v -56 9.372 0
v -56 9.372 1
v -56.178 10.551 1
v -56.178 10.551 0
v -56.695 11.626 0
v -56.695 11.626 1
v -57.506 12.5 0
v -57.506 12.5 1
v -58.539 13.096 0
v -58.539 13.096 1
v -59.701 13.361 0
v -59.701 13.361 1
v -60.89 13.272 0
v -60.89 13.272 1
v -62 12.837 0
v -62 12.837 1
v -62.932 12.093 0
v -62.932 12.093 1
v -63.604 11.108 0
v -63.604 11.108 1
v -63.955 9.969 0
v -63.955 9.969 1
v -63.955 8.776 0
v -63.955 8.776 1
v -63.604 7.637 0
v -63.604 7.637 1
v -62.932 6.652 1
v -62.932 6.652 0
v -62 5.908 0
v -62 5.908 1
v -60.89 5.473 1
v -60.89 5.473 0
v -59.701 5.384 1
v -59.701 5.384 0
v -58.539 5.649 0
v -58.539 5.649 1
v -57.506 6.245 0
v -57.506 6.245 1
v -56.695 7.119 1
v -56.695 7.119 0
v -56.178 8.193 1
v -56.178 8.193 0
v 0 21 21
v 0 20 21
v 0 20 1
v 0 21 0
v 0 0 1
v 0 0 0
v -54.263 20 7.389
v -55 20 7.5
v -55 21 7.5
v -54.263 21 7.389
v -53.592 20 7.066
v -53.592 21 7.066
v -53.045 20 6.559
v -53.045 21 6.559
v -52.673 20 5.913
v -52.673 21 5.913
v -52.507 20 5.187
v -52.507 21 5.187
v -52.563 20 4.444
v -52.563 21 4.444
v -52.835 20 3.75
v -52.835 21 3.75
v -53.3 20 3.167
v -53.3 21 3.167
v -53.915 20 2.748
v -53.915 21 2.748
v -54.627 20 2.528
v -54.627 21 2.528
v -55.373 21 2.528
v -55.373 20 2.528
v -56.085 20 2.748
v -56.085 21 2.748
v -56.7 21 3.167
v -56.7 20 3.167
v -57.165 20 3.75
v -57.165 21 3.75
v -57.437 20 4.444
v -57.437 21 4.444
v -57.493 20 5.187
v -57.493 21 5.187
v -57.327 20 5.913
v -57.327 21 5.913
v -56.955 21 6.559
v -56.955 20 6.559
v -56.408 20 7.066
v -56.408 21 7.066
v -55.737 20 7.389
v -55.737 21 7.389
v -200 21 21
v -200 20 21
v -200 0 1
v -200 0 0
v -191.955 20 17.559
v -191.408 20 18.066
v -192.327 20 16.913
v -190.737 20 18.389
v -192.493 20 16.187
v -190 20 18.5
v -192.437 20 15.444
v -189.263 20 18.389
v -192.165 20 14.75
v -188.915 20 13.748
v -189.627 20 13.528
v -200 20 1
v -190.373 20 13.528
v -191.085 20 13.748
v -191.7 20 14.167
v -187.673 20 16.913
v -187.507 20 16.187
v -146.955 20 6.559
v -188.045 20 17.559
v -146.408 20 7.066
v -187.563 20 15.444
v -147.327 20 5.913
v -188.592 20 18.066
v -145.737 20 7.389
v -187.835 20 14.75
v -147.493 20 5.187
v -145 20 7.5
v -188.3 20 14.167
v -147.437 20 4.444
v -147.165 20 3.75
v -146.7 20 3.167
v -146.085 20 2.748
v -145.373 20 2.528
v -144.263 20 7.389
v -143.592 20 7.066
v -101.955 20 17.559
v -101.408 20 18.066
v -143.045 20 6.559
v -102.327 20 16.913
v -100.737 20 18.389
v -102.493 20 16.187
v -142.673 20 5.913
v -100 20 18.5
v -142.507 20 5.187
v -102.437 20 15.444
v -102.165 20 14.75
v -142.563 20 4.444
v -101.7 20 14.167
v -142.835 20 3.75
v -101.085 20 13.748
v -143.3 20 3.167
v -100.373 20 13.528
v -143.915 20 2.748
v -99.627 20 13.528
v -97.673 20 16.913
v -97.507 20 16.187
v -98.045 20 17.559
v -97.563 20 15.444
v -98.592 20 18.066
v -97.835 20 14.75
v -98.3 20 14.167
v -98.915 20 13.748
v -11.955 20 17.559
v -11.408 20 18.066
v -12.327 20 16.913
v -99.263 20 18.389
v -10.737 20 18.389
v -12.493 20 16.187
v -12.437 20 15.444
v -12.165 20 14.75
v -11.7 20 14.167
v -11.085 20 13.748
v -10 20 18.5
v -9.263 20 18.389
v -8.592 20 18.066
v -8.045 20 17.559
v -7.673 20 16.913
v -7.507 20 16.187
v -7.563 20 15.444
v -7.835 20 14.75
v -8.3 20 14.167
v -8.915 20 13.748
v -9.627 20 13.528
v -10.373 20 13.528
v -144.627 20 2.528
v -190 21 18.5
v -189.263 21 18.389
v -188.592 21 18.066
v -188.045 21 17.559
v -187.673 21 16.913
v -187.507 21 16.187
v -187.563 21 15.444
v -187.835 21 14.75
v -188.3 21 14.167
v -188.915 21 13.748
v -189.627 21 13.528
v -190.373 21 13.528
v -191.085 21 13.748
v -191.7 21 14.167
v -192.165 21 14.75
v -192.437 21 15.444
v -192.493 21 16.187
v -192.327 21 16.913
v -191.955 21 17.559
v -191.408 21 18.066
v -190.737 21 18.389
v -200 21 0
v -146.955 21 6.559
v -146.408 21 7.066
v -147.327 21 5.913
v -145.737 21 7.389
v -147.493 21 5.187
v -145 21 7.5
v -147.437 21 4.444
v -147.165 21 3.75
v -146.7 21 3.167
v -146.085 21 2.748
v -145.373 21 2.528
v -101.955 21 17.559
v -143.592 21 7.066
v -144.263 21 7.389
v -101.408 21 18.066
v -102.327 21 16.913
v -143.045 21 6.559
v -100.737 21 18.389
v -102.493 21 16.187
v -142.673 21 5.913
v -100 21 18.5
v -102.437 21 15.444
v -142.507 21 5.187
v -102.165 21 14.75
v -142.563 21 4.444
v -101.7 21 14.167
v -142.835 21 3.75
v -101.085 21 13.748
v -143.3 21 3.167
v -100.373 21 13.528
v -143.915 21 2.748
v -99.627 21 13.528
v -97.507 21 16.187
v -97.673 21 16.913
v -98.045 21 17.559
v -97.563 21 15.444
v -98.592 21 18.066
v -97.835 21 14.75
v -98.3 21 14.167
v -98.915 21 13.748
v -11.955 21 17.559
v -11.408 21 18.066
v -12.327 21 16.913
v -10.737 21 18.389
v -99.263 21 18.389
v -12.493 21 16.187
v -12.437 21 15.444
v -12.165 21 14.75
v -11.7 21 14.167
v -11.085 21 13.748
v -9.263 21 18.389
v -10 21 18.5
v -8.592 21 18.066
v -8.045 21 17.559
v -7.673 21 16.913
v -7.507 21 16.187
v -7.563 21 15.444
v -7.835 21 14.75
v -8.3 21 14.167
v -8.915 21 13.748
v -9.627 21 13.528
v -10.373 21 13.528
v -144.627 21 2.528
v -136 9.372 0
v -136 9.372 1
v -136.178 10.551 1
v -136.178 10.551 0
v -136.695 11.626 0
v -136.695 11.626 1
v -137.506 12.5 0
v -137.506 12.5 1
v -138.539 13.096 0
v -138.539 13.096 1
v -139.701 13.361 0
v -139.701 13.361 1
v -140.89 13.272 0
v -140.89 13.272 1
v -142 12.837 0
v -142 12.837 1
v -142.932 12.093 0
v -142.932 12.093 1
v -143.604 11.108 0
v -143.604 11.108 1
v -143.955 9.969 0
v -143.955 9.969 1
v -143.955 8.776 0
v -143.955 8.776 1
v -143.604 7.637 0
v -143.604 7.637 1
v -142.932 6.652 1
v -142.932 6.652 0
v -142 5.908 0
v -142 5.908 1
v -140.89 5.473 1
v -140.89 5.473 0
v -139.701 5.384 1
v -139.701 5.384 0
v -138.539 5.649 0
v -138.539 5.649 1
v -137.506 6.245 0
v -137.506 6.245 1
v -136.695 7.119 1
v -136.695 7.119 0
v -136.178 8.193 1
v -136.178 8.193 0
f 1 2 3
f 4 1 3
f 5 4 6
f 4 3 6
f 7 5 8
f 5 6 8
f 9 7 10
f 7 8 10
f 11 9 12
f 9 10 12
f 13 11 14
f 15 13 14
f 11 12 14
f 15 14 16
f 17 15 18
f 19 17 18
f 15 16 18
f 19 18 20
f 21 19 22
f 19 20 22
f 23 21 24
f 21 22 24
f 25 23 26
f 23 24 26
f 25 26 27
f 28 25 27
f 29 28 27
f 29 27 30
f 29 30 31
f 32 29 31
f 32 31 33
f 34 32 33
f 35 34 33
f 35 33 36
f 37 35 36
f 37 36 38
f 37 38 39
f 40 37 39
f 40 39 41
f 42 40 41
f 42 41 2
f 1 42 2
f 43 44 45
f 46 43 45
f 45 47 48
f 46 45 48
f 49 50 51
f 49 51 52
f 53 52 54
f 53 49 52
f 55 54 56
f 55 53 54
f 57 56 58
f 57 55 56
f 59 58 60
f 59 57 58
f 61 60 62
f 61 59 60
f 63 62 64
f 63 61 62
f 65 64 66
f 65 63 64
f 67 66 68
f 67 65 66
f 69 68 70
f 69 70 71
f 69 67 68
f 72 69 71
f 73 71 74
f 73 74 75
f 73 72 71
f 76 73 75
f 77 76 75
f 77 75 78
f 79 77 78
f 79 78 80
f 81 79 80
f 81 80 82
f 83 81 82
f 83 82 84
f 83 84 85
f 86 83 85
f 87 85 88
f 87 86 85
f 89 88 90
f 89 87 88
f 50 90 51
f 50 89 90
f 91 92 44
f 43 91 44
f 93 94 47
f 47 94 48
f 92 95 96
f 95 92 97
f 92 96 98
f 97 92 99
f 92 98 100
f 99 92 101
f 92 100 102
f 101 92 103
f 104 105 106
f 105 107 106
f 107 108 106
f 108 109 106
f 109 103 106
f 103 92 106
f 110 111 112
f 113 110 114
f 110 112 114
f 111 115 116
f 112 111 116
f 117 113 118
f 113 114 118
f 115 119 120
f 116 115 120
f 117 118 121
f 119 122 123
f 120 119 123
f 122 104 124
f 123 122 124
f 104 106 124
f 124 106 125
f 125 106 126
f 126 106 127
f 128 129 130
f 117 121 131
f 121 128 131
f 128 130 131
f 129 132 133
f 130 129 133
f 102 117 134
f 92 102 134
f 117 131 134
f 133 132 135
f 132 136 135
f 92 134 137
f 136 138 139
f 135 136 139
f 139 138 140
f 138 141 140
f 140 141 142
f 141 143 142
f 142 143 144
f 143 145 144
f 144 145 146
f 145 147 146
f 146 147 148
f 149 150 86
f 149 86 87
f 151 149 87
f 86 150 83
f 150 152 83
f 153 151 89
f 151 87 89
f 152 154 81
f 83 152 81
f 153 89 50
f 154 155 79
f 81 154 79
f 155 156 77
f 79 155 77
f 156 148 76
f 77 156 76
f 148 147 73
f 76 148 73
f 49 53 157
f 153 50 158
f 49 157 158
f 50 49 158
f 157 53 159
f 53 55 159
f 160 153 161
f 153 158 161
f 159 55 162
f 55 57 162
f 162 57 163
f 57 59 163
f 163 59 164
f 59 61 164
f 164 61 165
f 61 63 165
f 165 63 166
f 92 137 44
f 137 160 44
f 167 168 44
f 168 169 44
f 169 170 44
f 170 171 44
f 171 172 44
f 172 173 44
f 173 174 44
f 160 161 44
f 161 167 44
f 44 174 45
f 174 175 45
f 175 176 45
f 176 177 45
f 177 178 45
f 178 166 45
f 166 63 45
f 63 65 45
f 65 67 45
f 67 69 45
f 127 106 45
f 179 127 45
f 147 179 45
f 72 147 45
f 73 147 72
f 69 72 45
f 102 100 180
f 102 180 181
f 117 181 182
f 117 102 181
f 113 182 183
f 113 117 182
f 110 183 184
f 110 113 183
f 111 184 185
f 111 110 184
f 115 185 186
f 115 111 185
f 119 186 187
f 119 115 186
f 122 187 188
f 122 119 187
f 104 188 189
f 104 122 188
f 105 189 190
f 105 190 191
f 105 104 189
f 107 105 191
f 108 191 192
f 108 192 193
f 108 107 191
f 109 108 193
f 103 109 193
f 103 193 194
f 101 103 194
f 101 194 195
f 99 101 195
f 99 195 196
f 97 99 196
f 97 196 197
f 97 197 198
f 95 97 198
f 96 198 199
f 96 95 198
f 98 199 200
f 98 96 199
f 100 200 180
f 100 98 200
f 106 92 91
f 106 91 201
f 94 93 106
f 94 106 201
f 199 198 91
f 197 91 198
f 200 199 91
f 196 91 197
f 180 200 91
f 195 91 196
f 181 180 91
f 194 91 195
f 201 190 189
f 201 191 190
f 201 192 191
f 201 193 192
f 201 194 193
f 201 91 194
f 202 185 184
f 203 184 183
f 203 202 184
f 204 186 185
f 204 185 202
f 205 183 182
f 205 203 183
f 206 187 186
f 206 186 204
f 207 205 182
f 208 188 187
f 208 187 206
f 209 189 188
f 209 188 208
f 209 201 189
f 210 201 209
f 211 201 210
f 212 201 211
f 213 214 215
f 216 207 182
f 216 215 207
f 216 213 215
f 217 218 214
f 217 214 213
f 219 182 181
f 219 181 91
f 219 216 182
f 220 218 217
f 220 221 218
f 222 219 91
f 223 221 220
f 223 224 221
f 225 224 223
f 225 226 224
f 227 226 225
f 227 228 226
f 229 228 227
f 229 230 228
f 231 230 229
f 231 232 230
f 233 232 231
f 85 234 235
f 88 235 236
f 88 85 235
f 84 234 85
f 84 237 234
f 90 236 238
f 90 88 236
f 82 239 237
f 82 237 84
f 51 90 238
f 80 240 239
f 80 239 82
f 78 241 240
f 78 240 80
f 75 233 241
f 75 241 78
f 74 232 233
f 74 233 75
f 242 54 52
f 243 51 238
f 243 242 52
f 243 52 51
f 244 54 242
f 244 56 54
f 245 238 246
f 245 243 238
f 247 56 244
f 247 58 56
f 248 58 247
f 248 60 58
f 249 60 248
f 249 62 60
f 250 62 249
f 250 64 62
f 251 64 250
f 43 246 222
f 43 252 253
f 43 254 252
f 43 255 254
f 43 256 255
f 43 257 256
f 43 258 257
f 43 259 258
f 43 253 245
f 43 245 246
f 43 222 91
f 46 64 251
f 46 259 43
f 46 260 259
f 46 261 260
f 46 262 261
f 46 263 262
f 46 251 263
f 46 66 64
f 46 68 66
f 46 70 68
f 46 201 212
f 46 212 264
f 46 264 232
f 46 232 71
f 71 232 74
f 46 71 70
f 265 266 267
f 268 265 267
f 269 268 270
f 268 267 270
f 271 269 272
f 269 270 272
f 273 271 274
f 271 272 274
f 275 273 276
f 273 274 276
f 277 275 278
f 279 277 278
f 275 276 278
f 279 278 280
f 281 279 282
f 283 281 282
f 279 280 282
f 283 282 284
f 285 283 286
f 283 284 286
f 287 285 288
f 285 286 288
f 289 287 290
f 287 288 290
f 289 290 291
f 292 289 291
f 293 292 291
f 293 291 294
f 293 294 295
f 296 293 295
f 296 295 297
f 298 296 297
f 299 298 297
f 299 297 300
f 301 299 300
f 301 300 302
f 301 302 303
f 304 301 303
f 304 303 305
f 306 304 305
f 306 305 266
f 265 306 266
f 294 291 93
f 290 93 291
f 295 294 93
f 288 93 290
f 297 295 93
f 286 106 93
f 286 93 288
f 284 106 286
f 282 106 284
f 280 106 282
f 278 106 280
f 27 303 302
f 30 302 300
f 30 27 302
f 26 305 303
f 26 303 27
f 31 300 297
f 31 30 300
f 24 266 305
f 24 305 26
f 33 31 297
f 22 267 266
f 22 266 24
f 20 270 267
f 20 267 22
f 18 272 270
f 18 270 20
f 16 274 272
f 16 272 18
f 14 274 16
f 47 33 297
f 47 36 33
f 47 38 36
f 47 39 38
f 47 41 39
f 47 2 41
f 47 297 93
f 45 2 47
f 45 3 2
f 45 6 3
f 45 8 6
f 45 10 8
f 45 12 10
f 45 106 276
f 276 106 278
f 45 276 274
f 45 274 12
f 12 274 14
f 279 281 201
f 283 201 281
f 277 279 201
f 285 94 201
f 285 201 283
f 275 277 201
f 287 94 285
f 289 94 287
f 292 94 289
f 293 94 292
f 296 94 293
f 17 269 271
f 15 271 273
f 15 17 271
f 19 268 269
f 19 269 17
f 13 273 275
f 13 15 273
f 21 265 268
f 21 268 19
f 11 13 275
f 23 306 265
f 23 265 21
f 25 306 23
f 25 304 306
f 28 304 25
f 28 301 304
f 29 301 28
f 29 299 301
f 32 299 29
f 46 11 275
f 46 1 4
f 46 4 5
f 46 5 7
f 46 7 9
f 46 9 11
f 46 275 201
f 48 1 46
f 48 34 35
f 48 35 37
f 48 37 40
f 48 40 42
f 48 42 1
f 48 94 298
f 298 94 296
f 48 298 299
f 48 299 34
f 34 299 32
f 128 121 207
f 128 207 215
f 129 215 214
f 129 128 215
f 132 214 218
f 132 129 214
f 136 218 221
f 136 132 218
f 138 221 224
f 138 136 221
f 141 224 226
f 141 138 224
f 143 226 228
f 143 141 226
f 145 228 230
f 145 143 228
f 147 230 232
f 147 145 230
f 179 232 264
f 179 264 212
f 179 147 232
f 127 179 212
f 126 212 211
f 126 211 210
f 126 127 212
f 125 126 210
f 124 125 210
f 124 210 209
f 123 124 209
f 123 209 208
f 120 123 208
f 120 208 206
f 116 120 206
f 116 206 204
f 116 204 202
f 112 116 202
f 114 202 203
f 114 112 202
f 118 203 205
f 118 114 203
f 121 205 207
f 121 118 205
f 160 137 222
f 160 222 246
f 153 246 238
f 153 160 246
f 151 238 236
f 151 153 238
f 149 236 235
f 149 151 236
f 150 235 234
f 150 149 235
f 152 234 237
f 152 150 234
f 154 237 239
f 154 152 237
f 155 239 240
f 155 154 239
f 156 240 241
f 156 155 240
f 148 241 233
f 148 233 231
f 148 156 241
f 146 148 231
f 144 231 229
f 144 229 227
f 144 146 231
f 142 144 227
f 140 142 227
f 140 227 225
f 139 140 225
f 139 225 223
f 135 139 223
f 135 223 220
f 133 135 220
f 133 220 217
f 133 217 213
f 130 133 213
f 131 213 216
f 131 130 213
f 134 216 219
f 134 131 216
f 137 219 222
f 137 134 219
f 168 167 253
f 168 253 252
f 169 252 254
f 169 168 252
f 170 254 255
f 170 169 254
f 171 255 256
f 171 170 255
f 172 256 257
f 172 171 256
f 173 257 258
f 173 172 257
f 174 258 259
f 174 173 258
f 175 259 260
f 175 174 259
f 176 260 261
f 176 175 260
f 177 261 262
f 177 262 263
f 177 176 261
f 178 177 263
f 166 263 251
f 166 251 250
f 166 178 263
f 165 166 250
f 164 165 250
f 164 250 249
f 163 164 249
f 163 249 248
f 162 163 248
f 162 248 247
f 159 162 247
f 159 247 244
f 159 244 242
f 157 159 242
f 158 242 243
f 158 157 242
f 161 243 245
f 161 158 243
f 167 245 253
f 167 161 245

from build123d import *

# Parameters (mm, degrees)
SKETCH1_W           = 200
SKETCH1_H           = 20
BOSS_EXTRUDE1_DEPTH = 1
SKETCH4_W           = 200
SKETCH4_H           = 21
SKETCH4_R           = 2.5
BOSS_EXTRUDE2_DEPTH = 1
SKETCH5_R           = 4
CUT_EXTRUDE1_DEPTH  = 10


with BuildPart() as part:
    # Sketch1 → Boss-Extrude1 (new body)
    with BuildSketch(Plane.XY):
        with Locations((-100, 10)):
            Rectangle(SKETCH1_W, SKETCH1_H)
    extrude(amount=BOSS_EXTRUDE1_DEPTH)

    # Sketch4 → Boss-Extrude2 (add)
    with BuildSketch(Plane(origin=(0, 20, 0), x_dir=(1, 0, 0), z_dir=(0, 1, 0))):
        with Locations((-100, -10.5)):
            Rectangle(SKETCH4_W, SKETCH4_H)
        with Locations(Location((-190, -16, 0), (0, 0, 270))):
            Circle(SKETCH4_R, mode=Mode.SUBTRACT)
        with Locations(Location((-145, -5, 0), (0, 0, 270))):
            Circle(SKETCH4_R, mode=Mode.SUBTRACT)
        with Locations(Location((-100, -16, 0), (0, 0, 270))):
            Circle(SKETCH4_R, mode=Mode.SUBTRACT)
        with Locations(Location((-55, -5, 0), (0, 0, 270))):
            Circle(SKETCH4_R, mode=Mode.SUBTRACT)
        with Locations(Location((-10, -16, 0), (0, 0, 270))):
            Circle(SKETCH4_R, mode=Mode.SUBTRACT)
    extrude(amount=BOSS_EXTRUDE2_DEPTH)

    # Sketch5 → Cut-Extrude1 (cut)
    with BuildSketch(Plane.XY.offset(1)):
        with Locations((-140, 9.372455226)):
            Circle(SKETCH5_R)
        with Locations((-60, 9.372455226)):
            Circle(SKETCH5_R)
    extrude(amount=-CUT_EXTRUDE1_DEPTH, mode=Mode.SUBTRACT)


solid = part.part
